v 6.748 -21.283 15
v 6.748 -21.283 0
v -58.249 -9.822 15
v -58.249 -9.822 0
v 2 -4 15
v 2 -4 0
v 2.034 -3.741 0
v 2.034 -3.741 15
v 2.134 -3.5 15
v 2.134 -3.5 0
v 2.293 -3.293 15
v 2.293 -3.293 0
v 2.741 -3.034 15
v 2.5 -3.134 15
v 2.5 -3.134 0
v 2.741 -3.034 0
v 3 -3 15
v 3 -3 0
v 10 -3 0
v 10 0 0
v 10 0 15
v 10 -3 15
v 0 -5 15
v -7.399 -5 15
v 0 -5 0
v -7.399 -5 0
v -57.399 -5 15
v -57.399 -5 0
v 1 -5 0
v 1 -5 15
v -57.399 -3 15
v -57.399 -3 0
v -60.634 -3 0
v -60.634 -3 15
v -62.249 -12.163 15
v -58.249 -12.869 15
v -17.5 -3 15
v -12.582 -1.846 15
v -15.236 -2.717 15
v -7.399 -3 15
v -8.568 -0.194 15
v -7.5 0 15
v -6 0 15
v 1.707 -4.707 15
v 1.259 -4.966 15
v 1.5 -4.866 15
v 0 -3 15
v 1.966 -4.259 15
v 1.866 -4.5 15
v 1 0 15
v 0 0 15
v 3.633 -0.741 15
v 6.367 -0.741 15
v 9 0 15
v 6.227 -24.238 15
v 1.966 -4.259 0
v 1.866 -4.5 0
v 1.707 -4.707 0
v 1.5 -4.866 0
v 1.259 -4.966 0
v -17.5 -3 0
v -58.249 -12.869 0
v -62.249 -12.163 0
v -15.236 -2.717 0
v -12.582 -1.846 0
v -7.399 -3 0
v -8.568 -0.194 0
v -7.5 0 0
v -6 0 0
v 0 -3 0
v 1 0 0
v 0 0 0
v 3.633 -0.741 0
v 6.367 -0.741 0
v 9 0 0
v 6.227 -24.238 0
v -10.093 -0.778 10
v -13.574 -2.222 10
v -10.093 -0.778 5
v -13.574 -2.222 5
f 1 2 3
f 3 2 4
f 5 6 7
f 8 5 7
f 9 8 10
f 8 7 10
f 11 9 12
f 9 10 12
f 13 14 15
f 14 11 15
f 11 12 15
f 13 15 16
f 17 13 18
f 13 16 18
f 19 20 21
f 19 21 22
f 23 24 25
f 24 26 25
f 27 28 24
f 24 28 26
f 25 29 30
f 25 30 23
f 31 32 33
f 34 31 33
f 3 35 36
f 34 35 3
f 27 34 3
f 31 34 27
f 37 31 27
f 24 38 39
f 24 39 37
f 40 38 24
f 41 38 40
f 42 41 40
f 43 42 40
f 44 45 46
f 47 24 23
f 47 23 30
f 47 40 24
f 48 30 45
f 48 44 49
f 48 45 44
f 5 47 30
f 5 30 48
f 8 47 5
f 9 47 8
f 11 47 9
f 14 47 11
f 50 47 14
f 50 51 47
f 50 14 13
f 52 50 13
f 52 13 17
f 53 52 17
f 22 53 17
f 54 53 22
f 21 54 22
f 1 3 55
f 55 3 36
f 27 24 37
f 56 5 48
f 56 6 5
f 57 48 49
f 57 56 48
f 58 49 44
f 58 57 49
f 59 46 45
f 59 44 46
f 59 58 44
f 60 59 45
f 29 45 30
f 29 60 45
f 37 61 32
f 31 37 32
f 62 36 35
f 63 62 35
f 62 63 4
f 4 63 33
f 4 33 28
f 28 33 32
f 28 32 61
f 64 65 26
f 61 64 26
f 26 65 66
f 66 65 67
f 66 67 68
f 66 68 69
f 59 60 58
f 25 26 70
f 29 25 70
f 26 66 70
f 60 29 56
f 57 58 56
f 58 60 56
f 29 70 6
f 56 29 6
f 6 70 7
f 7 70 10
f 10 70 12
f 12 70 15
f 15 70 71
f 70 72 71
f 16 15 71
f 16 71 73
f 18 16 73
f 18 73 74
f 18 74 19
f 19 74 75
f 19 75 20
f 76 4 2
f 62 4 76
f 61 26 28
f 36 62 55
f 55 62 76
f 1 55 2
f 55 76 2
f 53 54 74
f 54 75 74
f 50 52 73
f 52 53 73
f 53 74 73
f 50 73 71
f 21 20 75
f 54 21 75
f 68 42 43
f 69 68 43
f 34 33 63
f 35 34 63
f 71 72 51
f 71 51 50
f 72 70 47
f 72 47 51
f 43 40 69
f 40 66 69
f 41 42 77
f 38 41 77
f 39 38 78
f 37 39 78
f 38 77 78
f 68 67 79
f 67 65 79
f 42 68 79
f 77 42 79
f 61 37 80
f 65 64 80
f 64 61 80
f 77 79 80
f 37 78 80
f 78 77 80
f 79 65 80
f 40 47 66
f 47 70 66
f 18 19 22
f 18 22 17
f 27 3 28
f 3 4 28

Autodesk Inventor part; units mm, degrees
ref_plane "YZ Plane" through (0, 0, 0) normal (1, 0, 0) x (0, 1, 0)
ref_plane "XZ Plane" through (0, 0, 0) normal (0, 1, 0) x (-1, 0, 0)
ref_plane "XY Plane" through (0, 0, 0) normal (0, 0, 1) x (1, 0, 0)
sketch "Эскиз1" plane through (0, 0, 0) normal (0, 0, 1) x (1, 0, 0)
  line L0 (0, 0) -> (1, 0)
  line L1 (10, 0) -> (10, -3)
  line L2 (10, -3) -> (3, -3)
  line L3 (0, -3) -> (0, 0)
  line L4 (0, -3) -> (-7.3989, -3)
  line L5 (-7.3989, -3) -> (-7.3989, -5) construction
  line L6 (-7.3989, -5) -> (0, -5)
  line L7 (0, -5) -> (0, -3) construction
  line L8 (0, -3) -> (2, -3) construction
  line L9 (2, -4) -> (2, -4)
  line L10 (1, -5) -> (0, -5)
  line L11 (0, -5) -> (0, -3) construction
  line L12 (-7.3989, -3) -> (-6, 0)
  line L13 (-7.3989, -3) -> (-13.5, -3) construction
  line L14 (-57.3989, -3) -> (-57.3989, -5) construction
  line L15 (-57.3989, -5) -> (-7.3989, -5)
  line L16 (-7.3989, -5) -> (-7.3989, -3) construction
  arc A0 (1, -5) -> (2, -4) centre (1, -4) ccw
  arc A1 (3, -3) -> (2, -4) centre (3, -4) ccw
  line L17 (-13.5, -3) -> (-17.5, -3) construction
  line L18 (0, 0) -> (1, 0)
  line L19 (10, 0) -> (9, 0)
  arc A2 (1, 0) -> (9, 0) centre (5, 9.1652) ccw
  line L20 (-57.3989, -3) -> (-60.6335, -3)
  line L21 (-60.6335, -3) -> (-62.2492, -12.1633)
  line L22 (-62.2492, -12.8686) -> (-58.2492, -12.8686) construction
  line L23 (-58.2492, -12.8686) -> (-58.2492, -9.8223) construction
  line L24 (-58.2492, -12.8686) -> (6.2271, -24.2375)
  line L25 (6.2271, -24.2375) -> (6.7481, -21.2831)
  line L26 (6.7481, -21.2831) -> (-58.2492, -9.8223)
  line L27 (-58.2492, -9.8223) -> (-58.2492, -12.8686) construction
  line L28 (-57.3989, -5) -> (-57.3989, -3) construction
  line L29 (-58.2492, -9.8223) -> (-57.3989, -5)
  line L30 (-13.5, -3) -> (-17.5, -3) construction
  line L31 (-17.5, -3) -> (-57.3989, -3)
  line L32 (1, 0) -> (9, 0) construction
  line L33 (9, 0) -> (10, 0)
  line L34 (-58.2492, -12.8686) -> (-62.2492, -12.1633)
  line L35 (-62.2492, -12.1633) -> (-62.2492, -12.8686) construction
  line L36 (-6, 0) -> (-7.5, 0) construction
  line L37 (-7.5, 0) -> (-7.5, -3) construction
  line L38 (-7.5, 0) -> (-9.5, 0) construction
  line L39 (-7.5, 0) -> (-9.5, 0) construction
  line L40 (-9.5, 0) -> (-13.5, -3) construction
  line L41 (-13.5, -3) -> (-17.5, -3) construction
  spline S0 degree 3 poles (-7.5, 0) (-9.5, 0) (-13.5, -3) (-17.5, -3) knots 1 1 1 1 2 2 2 2
  line L42 (-7.5, 0) -> (-6, 0)
  point P0 (2, -5)
  point P1 (0, -5)
  dimension "d0" = 10
  dimension "d1" = 3
  dimension "d3" = 2
  dimension "d4" = 2
  dimension "d5" = 2
  dimension "d6" = 50
  dimension "d9" = 1
  dimension "d10" = 1
  dimension "d11" = 4
  dimension "d13" = 2
  dimension "d14" = 1
  dimension "d15" = 1
  dimension "d16" = 10
  dimension "d17" = 4
  dimension "d18" = 10
  dimension "d20" = 3
  dimension "d21" = 65.471
  dimension "d25" = 4.8967
  dimension "d26" = 66
  dimension "d27" = 90
  dimension "d28" = 100
  dimension "d29" = 65
  dimension "d30" = 6
  dimension "d31" = 3
  dimension "d32" = 1.5
  dimension "d33" = 6
  dimension "d34" = 2
extrude "Выдавливание1" add sketch "Эскиз1" along normal blind 15
properties part number "bat_lock01"
